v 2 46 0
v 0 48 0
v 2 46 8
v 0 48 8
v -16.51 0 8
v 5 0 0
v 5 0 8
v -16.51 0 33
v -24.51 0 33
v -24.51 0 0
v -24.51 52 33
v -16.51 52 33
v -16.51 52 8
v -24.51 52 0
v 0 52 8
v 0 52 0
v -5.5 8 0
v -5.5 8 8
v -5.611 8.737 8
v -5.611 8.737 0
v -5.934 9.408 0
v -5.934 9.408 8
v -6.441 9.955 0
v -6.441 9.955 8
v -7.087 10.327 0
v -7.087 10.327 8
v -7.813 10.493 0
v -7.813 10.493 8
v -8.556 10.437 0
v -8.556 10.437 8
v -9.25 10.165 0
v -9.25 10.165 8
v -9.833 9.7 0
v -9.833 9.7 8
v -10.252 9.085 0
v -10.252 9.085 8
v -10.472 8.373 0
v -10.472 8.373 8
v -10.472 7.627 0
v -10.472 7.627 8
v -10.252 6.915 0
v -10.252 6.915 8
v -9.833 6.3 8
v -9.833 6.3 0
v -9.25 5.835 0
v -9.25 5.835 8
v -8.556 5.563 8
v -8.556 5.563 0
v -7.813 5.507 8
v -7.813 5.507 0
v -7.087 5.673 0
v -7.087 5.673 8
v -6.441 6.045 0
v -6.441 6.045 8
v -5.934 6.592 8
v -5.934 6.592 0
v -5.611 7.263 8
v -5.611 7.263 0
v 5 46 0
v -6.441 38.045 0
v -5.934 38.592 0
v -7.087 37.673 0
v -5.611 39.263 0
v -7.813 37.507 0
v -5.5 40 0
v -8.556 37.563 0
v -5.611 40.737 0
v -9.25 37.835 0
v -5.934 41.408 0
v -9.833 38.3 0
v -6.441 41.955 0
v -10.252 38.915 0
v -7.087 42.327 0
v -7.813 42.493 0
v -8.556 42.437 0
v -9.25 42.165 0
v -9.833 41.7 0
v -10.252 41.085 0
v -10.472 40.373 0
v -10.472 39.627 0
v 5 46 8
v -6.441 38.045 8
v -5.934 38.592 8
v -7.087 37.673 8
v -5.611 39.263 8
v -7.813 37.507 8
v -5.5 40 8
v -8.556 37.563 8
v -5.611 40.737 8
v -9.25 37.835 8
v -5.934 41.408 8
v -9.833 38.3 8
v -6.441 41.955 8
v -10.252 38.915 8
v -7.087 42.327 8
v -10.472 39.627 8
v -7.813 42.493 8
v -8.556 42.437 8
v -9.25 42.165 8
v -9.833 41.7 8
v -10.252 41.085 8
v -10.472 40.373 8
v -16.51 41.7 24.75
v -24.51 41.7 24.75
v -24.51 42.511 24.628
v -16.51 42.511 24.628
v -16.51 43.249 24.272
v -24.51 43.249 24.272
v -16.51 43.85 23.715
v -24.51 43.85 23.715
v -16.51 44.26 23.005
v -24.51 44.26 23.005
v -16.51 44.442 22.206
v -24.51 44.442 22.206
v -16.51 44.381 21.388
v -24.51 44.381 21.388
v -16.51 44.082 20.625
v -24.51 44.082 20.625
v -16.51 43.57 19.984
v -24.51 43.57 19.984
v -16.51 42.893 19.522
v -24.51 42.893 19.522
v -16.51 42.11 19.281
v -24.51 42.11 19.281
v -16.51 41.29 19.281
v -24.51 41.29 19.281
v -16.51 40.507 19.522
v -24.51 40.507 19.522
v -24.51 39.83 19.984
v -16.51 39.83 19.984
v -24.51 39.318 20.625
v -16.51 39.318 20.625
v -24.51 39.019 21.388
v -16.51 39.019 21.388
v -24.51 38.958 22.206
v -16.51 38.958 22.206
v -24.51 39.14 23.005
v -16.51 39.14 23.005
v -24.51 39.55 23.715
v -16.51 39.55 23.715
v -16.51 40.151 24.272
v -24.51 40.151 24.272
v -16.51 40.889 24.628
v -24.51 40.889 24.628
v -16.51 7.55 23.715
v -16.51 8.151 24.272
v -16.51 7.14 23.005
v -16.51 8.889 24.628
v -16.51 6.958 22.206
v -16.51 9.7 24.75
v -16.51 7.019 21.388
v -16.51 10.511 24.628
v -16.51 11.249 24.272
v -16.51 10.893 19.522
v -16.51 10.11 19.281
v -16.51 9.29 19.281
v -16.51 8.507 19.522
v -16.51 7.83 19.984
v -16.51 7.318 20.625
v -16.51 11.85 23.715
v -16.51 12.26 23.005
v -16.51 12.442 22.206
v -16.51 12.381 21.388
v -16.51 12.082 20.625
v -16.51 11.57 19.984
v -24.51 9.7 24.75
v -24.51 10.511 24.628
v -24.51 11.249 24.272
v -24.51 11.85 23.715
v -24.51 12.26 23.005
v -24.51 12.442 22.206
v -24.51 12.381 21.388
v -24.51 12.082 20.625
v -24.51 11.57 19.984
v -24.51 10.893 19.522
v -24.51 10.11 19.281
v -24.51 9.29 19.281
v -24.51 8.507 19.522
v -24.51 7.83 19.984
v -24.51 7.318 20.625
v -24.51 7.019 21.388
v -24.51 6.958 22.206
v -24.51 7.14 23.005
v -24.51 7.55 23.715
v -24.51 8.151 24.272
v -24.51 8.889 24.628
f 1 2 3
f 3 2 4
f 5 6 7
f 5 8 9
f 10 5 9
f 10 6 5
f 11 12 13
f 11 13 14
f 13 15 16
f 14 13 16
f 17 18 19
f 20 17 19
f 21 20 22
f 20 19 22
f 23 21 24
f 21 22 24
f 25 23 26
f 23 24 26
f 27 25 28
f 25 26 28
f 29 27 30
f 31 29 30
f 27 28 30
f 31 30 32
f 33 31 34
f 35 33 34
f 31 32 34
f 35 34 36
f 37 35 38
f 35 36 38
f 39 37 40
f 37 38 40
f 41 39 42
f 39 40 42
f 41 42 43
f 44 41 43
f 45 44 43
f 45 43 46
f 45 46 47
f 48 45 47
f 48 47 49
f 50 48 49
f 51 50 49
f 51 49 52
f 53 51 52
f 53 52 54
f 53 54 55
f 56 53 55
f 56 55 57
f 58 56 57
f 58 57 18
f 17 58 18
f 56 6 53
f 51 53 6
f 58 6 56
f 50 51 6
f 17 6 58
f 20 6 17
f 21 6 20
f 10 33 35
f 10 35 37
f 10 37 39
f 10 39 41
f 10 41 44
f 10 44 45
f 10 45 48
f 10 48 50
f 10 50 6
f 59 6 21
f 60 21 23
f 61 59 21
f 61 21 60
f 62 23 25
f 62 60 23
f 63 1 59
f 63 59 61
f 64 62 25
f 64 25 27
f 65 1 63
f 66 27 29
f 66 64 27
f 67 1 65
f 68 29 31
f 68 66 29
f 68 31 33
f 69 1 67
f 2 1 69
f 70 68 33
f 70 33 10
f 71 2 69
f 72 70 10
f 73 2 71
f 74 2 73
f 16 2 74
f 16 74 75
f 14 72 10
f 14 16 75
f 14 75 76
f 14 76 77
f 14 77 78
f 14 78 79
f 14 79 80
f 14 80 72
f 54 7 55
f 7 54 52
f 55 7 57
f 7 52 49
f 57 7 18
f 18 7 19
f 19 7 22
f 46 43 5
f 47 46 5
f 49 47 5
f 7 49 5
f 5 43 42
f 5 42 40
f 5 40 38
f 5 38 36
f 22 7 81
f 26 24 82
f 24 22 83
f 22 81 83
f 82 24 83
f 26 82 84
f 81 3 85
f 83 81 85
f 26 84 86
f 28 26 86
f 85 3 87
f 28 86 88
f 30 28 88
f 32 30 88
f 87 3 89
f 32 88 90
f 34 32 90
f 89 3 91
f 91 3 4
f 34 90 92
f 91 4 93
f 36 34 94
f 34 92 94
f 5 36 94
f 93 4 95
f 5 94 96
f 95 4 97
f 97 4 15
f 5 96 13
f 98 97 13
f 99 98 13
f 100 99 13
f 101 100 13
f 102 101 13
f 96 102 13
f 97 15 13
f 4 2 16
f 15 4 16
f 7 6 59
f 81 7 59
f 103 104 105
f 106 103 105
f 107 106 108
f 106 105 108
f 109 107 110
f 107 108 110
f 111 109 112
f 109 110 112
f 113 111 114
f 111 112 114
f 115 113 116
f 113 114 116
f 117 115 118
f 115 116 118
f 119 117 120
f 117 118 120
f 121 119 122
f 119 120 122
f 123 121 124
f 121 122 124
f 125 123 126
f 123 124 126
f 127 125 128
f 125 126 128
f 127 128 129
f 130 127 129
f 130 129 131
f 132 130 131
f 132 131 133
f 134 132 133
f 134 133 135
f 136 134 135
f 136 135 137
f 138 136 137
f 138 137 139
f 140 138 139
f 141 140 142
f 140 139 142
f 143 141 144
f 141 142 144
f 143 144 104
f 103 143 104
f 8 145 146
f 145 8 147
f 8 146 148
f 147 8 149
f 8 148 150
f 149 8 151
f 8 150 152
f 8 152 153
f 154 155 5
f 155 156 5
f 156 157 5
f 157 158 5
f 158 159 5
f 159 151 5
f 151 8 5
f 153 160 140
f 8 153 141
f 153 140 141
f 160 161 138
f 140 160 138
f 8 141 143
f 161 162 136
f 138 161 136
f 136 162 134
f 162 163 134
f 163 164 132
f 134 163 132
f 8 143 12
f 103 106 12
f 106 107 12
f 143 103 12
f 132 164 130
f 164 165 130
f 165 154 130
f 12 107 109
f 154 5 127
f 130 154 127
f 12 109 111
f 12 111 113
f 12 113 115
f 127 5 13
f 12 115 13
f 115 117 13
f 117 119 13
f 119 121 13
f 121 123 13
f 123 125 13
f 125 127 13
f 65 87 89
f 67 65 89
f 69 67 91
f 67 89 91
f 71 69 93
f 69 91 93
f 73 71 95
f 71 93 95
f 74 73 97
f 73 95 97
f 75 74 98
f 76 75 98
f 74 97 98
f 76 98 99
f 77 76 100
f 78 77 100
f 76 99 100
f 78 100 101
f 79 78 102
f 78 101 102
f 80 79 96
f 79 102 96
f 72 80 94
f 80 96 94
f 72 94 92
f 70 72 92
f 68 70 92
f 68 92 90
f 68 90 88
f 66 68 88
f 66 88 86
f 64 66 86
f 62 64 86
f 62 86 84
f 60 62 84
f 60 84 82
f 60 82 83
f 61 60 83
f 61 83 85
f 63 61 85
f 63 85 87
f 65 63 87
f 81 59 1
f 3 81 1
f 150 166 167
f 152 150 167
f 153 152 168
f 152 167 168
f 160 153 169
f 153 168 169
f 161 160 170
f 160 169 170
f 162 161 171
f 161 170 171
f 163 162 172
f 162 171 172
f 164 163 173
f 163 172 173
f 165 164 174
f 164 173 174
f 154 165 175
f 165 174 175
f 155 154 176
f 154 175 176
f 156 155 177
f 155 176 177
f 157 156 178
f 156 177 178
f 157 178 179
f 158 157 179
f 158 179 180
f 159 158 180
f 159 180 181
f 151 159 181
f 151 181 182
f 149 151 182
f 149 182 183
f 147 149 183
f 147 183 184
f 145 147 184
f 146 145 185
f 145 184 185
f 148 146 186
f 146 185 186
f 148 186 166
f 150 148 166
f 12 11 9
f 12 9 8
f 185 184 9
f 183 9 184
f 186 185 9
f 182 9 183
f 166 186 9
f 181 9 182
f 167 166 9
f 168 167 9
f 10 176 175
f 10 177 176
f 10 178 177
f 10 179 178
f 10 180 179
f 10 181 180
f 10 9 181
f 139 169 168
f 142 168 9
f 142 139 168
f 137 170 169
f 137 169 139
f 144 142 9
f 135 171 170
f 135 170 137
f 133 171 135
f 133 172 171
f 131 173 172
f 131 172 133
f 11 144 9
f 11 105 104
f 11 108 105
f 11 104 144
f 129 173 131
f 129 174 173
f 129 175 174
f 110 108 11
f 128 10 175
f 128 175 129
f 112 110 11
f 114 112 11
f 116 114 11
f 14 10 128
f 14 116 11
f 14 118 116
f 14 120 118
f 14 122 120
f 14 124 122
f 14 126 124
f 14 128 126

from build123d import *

# Parameters (mm, degrees)
SKETCH1_W               = 24.51
SKETCH1_H               = 148
BOSS_EXTRUDE1_DEPTH     = 8
SKETCH2_W               = 8
SKETCH2_H               = 148
BOSS_EXTRUDE2_DEPTH     = 25
SKETCH4_W               = 20.3
SKETCH4_H               = 36.8
BOSS_EXTRUDE3_DEPTH     = 8
SKETCH5_W               = 23
SKETCH5_H               = 6
BOSS_EXTRUDE4_DEPTH     = 25
CUT_EXTRUDE2_REACH      = 151.752
SKETCH6_R               = 2
RIB1_REACH              = 159.03
SKETCH8_WALL_W          = 336.456302216
SKETCH8_WALL_H          = 3
MIRROR2_COPY_1_REACH    = 159.03
MIRROR2_COPY_1_SKETCH_W = 336.456302216
MIRROR2_COPY_1_SKETCH_H = 3
SKETCH3_R               = 2.5
CUT_EXTRUDE1_DEPTH      = 10
SKETCH12_R              = 2.75
CUT_EXTRUDE3_DEPTH      = 8
SKETCH13_W              = 5
SKETCH13_H              = 46
BOSS_EXTRUDE5_DEPTH     = 8
SKETCH14_W              = 3
SKETCH14_H              = 17
BOSS_EXTRUDE6_DEPTH     = 8
CHAMFER1_SIZE           = 2
CHAMFER2_SIZE           = 6
CHAMFER2_SIZE2          = 4.047051101
SKETCH15_W              = 33
SKETCH15_H              = 96
CUT_EXTRUDE4_DEPTH      = 45


with BuildPart() as part:
    # Sketch1 → Boss-Extrude1 (new body)
    with BuildSketch(Plane.XY):
        with Locations((-12.255, 74)):
            Rectangle(SKETCH1_W, SKETCH1_H)
    extrude(amount=BOSS_EXTRUDE1_DEPTH)

    # Sketch2 → Boss-Extrude2 (add)
    with BuildSketch(Plane.XY.offset(8)):
        with Locations((-20.51, 74)):
            Rectangle(SKETCH2_W, SKETCH2_H)
    extrude(amount=BOSS_EXTRUDE2_DEPTH)

    # Sketch4 → Boss-Extrude3 (add)
    with BuildSketch(Plane(origin=(0, 0, 0), x_dir=(-1, 0, 0), z_dir=(0, 0, -1))):
        with Locations((-10.15, 129.6)):
            Rectangle(SKETCH4_W, SKETCH4_H)
    extrude(amount=-BOSS_EXTRUDE3_DEPTH)

    # Sketch5 → Boss-Extrude4 (add)
    with BuildSketch(Plane.XY.offset(8)):
        with Locations((8.8, 118.2)):
            Rectangle(SKETCH5_W, SKETCH5_H)
        with Locations((8.8, 141)):
            Rectangle(SKETCH5_W, SKETCH5_H)
    extrude(amount=BOSS_EXTRUDE4_DEPTH)

    # Cut-Extrude2: up to this face of the body (flat: up to its plane)
    cut_extrude2_end = Plane(part.part.faces().sort_by_distance((8.8, 115.2, 20.5))[0])
    # Sketch6 → Cut-Extrude2 (cut, up to the picked face)
    with BuildSketch(Plane(origin=(0, 144, 0), x_dir=(1, 0, 0), z_dir=(0, 1, 0)), mode=Mode.PRIVATE) as cut_extrude2_sk1:
        with Locations(Location((6.6, -20.5, 0), (0, 0, 270))):
            Circle(SKETCH6_R)
    cut_extrude2_tool1 = split(extrude(cut_extrude2_sk1.sketch, amount=-CUT_EXTRUDE2_REACH, mode=Mode.PRIVATE), bisect_by=cut_extrude2_end, keep=Keep.BOTH, mode=Mode.PRIVATE)
    add(cut_extrude2_tool1.solids().sort_by(Axis((6.6, 144, 20.5), (0, -1, 0)))[0], mode=Mode.SUBTRACT)

    # Sketch8 wall → Rib1 (add, up to next)
    with BuildSketch(Plane(origin=(16.3, 146, 18), x_dir=(0, -0.196116135138, 0.980580675691), z_dir=(0, -0.980580675691, -0.196116135138)), mode=Mode.PRIVATE) as rib1_sk1:
        Rectangle(SKETCH8_WALL_W, SKETCH8_WALL_H)
    rib1_tool1 = extrude(rib1_sk1.sketch, amount=RIB1_REACH, mode=Mode.PRIVATE) - part.part
    rib1 = rib1_tool1.solids().sort_by_distance((16.3, 146, 18))[0]
    add(rib1)

    # Mirror1: Rib1 across plane
    add(rib1.mirror(Plane.ZX.offset(129.6)))

    # Mirror2: Rib1 across plane
    add(rib1.mirror(Plane.ZY.offset(-7.55)))

    # Mirror2 copy 1 sketch → Mirror2 copy 1 (add, up to next)
    with BuildSketch(Plane(origin=(-1.2, 113.2, 18), x_dir=(0, 0.196116135138, 0.980580675691), z_dir=(0, 0.980580675691, -0.196116135138)), mode=Mode.PRIVATE) as mirror2_copy_1_sk1:
        Rectangle(MIRROR2_COPY_1_SKETCH_W, MIRROR2_COPY_1_SKETCH_H)
    mirror2_copy_1_tool1 = extrude(mirror2_copy_1_sk1.sketch, amount=MIRROR2_COPY_1_REACH, mode=Mode.PRIVATE) - part.part
    add(mirror2_copy_1_tool1.solids().sort_by_distance((-1.2, 113.2, 18))[0])

    # Sketch3 → Cut-Extrude1 (cut)
    with BuildSketch(Plane.XY.offset(8)):
        with Locations((-8, 8)):
            Circle(SKETCH3_R)
        with Locations((-8, 40)):
            Circle(SKETCH3_R)
        with Locations((-8, 100)):
            Circle(SKETCH3_R)
        with Locations((-8, 132)):
            Circle(SKETCH3_R)
    extrude(amount=-CUT_EXTRUDE1_DEPTH, mode=Mode.SUBTRACT)

    # Sketch12 → Cut-Extrude3 (cut)
    with BuildSketch(Plane.ZY.offset(24.51)):
        with Locations((22, 138.8)):
            Circle(SKETCH12_R)
        with Locations((22, 106.8)):
            Circle(SKETCH12_R)
        with Locations((22, 41.7)):
            Circle(SKETCH12_R)
        with Locations((22, 9.7)):
            Circle(SKETCH12_R)
    extrude(amount=-CUT_EXTRUDE3_DEPTH, mode=Mode.SUBTRACT)

    # Sketch13 → Boss-Extrude5 (add)
    with BuildSketch(Plane(origin=(0, 0, 0), x_dir=(-1, 0, 0), z_dir=(0, 0, -1))):
        with Locations((-2.5, 23)):
            Rectangle(SKETCH13_W, SKETCH13_H)
    extrude(amount=-BOSS_EXTRUDE5_DEPTH)

    # Sketch14 → Boss-Extrude6 (add)
    with BuildSketch(Plane(origin=(0, 0, 0), x_dir=(-1, 0, 0), z_dir=(0, 0, -1))):
        with Locations((-1.5, 102.7)):
            Rectangle(SKETCH14_W, SKETCH14_H)
    extrude(amount=-BOSS_EXTRUDE6_DEPTH)

    # Chamfer1
    chamfer1_edges = [part.edges().sort_by_distance(p)[0] for p in [
        (0, 46, 4),
        (3, 111.2, 4),
        (0, 94.2, 4),
    ]]
    chamfer(chamfer1_edges, length=CHAMFER1_SIZE)

    # Chamfer2
    chamfer2_edges = [part.edges().sort_by_distance(p)[0] for p in [
        (8.8, 121.2, 8),
        (8.8, 138, 8),
    ]]
    chamfer2_side = [part.faces().sort_by_distance(p)[0] for p in [
        (-4.974591741, 76.782250606, 8),
    ]]
    chamfer(chamfer2_edges, length=CHAMFER2_SIZE, length2=CHAMFER2_SIZE2, reference=chamfer2_side[0])

    # Sketch15 → Cut-Extrude4 (cut)
    with BuildSketch(Plane(origin=(20.3, 0, 0), x_dir=(0, 0, -1), z_dir=(1, 0, 0))):
        with Locations((-16.5, 100)):
            Rectangle(SKETCH15_W, SKETCH15_H)
    extrude(amount=-CUT_EXTRUDE4_DEPTH, mode=Mode.SUBTRACT)


solid = part.part
